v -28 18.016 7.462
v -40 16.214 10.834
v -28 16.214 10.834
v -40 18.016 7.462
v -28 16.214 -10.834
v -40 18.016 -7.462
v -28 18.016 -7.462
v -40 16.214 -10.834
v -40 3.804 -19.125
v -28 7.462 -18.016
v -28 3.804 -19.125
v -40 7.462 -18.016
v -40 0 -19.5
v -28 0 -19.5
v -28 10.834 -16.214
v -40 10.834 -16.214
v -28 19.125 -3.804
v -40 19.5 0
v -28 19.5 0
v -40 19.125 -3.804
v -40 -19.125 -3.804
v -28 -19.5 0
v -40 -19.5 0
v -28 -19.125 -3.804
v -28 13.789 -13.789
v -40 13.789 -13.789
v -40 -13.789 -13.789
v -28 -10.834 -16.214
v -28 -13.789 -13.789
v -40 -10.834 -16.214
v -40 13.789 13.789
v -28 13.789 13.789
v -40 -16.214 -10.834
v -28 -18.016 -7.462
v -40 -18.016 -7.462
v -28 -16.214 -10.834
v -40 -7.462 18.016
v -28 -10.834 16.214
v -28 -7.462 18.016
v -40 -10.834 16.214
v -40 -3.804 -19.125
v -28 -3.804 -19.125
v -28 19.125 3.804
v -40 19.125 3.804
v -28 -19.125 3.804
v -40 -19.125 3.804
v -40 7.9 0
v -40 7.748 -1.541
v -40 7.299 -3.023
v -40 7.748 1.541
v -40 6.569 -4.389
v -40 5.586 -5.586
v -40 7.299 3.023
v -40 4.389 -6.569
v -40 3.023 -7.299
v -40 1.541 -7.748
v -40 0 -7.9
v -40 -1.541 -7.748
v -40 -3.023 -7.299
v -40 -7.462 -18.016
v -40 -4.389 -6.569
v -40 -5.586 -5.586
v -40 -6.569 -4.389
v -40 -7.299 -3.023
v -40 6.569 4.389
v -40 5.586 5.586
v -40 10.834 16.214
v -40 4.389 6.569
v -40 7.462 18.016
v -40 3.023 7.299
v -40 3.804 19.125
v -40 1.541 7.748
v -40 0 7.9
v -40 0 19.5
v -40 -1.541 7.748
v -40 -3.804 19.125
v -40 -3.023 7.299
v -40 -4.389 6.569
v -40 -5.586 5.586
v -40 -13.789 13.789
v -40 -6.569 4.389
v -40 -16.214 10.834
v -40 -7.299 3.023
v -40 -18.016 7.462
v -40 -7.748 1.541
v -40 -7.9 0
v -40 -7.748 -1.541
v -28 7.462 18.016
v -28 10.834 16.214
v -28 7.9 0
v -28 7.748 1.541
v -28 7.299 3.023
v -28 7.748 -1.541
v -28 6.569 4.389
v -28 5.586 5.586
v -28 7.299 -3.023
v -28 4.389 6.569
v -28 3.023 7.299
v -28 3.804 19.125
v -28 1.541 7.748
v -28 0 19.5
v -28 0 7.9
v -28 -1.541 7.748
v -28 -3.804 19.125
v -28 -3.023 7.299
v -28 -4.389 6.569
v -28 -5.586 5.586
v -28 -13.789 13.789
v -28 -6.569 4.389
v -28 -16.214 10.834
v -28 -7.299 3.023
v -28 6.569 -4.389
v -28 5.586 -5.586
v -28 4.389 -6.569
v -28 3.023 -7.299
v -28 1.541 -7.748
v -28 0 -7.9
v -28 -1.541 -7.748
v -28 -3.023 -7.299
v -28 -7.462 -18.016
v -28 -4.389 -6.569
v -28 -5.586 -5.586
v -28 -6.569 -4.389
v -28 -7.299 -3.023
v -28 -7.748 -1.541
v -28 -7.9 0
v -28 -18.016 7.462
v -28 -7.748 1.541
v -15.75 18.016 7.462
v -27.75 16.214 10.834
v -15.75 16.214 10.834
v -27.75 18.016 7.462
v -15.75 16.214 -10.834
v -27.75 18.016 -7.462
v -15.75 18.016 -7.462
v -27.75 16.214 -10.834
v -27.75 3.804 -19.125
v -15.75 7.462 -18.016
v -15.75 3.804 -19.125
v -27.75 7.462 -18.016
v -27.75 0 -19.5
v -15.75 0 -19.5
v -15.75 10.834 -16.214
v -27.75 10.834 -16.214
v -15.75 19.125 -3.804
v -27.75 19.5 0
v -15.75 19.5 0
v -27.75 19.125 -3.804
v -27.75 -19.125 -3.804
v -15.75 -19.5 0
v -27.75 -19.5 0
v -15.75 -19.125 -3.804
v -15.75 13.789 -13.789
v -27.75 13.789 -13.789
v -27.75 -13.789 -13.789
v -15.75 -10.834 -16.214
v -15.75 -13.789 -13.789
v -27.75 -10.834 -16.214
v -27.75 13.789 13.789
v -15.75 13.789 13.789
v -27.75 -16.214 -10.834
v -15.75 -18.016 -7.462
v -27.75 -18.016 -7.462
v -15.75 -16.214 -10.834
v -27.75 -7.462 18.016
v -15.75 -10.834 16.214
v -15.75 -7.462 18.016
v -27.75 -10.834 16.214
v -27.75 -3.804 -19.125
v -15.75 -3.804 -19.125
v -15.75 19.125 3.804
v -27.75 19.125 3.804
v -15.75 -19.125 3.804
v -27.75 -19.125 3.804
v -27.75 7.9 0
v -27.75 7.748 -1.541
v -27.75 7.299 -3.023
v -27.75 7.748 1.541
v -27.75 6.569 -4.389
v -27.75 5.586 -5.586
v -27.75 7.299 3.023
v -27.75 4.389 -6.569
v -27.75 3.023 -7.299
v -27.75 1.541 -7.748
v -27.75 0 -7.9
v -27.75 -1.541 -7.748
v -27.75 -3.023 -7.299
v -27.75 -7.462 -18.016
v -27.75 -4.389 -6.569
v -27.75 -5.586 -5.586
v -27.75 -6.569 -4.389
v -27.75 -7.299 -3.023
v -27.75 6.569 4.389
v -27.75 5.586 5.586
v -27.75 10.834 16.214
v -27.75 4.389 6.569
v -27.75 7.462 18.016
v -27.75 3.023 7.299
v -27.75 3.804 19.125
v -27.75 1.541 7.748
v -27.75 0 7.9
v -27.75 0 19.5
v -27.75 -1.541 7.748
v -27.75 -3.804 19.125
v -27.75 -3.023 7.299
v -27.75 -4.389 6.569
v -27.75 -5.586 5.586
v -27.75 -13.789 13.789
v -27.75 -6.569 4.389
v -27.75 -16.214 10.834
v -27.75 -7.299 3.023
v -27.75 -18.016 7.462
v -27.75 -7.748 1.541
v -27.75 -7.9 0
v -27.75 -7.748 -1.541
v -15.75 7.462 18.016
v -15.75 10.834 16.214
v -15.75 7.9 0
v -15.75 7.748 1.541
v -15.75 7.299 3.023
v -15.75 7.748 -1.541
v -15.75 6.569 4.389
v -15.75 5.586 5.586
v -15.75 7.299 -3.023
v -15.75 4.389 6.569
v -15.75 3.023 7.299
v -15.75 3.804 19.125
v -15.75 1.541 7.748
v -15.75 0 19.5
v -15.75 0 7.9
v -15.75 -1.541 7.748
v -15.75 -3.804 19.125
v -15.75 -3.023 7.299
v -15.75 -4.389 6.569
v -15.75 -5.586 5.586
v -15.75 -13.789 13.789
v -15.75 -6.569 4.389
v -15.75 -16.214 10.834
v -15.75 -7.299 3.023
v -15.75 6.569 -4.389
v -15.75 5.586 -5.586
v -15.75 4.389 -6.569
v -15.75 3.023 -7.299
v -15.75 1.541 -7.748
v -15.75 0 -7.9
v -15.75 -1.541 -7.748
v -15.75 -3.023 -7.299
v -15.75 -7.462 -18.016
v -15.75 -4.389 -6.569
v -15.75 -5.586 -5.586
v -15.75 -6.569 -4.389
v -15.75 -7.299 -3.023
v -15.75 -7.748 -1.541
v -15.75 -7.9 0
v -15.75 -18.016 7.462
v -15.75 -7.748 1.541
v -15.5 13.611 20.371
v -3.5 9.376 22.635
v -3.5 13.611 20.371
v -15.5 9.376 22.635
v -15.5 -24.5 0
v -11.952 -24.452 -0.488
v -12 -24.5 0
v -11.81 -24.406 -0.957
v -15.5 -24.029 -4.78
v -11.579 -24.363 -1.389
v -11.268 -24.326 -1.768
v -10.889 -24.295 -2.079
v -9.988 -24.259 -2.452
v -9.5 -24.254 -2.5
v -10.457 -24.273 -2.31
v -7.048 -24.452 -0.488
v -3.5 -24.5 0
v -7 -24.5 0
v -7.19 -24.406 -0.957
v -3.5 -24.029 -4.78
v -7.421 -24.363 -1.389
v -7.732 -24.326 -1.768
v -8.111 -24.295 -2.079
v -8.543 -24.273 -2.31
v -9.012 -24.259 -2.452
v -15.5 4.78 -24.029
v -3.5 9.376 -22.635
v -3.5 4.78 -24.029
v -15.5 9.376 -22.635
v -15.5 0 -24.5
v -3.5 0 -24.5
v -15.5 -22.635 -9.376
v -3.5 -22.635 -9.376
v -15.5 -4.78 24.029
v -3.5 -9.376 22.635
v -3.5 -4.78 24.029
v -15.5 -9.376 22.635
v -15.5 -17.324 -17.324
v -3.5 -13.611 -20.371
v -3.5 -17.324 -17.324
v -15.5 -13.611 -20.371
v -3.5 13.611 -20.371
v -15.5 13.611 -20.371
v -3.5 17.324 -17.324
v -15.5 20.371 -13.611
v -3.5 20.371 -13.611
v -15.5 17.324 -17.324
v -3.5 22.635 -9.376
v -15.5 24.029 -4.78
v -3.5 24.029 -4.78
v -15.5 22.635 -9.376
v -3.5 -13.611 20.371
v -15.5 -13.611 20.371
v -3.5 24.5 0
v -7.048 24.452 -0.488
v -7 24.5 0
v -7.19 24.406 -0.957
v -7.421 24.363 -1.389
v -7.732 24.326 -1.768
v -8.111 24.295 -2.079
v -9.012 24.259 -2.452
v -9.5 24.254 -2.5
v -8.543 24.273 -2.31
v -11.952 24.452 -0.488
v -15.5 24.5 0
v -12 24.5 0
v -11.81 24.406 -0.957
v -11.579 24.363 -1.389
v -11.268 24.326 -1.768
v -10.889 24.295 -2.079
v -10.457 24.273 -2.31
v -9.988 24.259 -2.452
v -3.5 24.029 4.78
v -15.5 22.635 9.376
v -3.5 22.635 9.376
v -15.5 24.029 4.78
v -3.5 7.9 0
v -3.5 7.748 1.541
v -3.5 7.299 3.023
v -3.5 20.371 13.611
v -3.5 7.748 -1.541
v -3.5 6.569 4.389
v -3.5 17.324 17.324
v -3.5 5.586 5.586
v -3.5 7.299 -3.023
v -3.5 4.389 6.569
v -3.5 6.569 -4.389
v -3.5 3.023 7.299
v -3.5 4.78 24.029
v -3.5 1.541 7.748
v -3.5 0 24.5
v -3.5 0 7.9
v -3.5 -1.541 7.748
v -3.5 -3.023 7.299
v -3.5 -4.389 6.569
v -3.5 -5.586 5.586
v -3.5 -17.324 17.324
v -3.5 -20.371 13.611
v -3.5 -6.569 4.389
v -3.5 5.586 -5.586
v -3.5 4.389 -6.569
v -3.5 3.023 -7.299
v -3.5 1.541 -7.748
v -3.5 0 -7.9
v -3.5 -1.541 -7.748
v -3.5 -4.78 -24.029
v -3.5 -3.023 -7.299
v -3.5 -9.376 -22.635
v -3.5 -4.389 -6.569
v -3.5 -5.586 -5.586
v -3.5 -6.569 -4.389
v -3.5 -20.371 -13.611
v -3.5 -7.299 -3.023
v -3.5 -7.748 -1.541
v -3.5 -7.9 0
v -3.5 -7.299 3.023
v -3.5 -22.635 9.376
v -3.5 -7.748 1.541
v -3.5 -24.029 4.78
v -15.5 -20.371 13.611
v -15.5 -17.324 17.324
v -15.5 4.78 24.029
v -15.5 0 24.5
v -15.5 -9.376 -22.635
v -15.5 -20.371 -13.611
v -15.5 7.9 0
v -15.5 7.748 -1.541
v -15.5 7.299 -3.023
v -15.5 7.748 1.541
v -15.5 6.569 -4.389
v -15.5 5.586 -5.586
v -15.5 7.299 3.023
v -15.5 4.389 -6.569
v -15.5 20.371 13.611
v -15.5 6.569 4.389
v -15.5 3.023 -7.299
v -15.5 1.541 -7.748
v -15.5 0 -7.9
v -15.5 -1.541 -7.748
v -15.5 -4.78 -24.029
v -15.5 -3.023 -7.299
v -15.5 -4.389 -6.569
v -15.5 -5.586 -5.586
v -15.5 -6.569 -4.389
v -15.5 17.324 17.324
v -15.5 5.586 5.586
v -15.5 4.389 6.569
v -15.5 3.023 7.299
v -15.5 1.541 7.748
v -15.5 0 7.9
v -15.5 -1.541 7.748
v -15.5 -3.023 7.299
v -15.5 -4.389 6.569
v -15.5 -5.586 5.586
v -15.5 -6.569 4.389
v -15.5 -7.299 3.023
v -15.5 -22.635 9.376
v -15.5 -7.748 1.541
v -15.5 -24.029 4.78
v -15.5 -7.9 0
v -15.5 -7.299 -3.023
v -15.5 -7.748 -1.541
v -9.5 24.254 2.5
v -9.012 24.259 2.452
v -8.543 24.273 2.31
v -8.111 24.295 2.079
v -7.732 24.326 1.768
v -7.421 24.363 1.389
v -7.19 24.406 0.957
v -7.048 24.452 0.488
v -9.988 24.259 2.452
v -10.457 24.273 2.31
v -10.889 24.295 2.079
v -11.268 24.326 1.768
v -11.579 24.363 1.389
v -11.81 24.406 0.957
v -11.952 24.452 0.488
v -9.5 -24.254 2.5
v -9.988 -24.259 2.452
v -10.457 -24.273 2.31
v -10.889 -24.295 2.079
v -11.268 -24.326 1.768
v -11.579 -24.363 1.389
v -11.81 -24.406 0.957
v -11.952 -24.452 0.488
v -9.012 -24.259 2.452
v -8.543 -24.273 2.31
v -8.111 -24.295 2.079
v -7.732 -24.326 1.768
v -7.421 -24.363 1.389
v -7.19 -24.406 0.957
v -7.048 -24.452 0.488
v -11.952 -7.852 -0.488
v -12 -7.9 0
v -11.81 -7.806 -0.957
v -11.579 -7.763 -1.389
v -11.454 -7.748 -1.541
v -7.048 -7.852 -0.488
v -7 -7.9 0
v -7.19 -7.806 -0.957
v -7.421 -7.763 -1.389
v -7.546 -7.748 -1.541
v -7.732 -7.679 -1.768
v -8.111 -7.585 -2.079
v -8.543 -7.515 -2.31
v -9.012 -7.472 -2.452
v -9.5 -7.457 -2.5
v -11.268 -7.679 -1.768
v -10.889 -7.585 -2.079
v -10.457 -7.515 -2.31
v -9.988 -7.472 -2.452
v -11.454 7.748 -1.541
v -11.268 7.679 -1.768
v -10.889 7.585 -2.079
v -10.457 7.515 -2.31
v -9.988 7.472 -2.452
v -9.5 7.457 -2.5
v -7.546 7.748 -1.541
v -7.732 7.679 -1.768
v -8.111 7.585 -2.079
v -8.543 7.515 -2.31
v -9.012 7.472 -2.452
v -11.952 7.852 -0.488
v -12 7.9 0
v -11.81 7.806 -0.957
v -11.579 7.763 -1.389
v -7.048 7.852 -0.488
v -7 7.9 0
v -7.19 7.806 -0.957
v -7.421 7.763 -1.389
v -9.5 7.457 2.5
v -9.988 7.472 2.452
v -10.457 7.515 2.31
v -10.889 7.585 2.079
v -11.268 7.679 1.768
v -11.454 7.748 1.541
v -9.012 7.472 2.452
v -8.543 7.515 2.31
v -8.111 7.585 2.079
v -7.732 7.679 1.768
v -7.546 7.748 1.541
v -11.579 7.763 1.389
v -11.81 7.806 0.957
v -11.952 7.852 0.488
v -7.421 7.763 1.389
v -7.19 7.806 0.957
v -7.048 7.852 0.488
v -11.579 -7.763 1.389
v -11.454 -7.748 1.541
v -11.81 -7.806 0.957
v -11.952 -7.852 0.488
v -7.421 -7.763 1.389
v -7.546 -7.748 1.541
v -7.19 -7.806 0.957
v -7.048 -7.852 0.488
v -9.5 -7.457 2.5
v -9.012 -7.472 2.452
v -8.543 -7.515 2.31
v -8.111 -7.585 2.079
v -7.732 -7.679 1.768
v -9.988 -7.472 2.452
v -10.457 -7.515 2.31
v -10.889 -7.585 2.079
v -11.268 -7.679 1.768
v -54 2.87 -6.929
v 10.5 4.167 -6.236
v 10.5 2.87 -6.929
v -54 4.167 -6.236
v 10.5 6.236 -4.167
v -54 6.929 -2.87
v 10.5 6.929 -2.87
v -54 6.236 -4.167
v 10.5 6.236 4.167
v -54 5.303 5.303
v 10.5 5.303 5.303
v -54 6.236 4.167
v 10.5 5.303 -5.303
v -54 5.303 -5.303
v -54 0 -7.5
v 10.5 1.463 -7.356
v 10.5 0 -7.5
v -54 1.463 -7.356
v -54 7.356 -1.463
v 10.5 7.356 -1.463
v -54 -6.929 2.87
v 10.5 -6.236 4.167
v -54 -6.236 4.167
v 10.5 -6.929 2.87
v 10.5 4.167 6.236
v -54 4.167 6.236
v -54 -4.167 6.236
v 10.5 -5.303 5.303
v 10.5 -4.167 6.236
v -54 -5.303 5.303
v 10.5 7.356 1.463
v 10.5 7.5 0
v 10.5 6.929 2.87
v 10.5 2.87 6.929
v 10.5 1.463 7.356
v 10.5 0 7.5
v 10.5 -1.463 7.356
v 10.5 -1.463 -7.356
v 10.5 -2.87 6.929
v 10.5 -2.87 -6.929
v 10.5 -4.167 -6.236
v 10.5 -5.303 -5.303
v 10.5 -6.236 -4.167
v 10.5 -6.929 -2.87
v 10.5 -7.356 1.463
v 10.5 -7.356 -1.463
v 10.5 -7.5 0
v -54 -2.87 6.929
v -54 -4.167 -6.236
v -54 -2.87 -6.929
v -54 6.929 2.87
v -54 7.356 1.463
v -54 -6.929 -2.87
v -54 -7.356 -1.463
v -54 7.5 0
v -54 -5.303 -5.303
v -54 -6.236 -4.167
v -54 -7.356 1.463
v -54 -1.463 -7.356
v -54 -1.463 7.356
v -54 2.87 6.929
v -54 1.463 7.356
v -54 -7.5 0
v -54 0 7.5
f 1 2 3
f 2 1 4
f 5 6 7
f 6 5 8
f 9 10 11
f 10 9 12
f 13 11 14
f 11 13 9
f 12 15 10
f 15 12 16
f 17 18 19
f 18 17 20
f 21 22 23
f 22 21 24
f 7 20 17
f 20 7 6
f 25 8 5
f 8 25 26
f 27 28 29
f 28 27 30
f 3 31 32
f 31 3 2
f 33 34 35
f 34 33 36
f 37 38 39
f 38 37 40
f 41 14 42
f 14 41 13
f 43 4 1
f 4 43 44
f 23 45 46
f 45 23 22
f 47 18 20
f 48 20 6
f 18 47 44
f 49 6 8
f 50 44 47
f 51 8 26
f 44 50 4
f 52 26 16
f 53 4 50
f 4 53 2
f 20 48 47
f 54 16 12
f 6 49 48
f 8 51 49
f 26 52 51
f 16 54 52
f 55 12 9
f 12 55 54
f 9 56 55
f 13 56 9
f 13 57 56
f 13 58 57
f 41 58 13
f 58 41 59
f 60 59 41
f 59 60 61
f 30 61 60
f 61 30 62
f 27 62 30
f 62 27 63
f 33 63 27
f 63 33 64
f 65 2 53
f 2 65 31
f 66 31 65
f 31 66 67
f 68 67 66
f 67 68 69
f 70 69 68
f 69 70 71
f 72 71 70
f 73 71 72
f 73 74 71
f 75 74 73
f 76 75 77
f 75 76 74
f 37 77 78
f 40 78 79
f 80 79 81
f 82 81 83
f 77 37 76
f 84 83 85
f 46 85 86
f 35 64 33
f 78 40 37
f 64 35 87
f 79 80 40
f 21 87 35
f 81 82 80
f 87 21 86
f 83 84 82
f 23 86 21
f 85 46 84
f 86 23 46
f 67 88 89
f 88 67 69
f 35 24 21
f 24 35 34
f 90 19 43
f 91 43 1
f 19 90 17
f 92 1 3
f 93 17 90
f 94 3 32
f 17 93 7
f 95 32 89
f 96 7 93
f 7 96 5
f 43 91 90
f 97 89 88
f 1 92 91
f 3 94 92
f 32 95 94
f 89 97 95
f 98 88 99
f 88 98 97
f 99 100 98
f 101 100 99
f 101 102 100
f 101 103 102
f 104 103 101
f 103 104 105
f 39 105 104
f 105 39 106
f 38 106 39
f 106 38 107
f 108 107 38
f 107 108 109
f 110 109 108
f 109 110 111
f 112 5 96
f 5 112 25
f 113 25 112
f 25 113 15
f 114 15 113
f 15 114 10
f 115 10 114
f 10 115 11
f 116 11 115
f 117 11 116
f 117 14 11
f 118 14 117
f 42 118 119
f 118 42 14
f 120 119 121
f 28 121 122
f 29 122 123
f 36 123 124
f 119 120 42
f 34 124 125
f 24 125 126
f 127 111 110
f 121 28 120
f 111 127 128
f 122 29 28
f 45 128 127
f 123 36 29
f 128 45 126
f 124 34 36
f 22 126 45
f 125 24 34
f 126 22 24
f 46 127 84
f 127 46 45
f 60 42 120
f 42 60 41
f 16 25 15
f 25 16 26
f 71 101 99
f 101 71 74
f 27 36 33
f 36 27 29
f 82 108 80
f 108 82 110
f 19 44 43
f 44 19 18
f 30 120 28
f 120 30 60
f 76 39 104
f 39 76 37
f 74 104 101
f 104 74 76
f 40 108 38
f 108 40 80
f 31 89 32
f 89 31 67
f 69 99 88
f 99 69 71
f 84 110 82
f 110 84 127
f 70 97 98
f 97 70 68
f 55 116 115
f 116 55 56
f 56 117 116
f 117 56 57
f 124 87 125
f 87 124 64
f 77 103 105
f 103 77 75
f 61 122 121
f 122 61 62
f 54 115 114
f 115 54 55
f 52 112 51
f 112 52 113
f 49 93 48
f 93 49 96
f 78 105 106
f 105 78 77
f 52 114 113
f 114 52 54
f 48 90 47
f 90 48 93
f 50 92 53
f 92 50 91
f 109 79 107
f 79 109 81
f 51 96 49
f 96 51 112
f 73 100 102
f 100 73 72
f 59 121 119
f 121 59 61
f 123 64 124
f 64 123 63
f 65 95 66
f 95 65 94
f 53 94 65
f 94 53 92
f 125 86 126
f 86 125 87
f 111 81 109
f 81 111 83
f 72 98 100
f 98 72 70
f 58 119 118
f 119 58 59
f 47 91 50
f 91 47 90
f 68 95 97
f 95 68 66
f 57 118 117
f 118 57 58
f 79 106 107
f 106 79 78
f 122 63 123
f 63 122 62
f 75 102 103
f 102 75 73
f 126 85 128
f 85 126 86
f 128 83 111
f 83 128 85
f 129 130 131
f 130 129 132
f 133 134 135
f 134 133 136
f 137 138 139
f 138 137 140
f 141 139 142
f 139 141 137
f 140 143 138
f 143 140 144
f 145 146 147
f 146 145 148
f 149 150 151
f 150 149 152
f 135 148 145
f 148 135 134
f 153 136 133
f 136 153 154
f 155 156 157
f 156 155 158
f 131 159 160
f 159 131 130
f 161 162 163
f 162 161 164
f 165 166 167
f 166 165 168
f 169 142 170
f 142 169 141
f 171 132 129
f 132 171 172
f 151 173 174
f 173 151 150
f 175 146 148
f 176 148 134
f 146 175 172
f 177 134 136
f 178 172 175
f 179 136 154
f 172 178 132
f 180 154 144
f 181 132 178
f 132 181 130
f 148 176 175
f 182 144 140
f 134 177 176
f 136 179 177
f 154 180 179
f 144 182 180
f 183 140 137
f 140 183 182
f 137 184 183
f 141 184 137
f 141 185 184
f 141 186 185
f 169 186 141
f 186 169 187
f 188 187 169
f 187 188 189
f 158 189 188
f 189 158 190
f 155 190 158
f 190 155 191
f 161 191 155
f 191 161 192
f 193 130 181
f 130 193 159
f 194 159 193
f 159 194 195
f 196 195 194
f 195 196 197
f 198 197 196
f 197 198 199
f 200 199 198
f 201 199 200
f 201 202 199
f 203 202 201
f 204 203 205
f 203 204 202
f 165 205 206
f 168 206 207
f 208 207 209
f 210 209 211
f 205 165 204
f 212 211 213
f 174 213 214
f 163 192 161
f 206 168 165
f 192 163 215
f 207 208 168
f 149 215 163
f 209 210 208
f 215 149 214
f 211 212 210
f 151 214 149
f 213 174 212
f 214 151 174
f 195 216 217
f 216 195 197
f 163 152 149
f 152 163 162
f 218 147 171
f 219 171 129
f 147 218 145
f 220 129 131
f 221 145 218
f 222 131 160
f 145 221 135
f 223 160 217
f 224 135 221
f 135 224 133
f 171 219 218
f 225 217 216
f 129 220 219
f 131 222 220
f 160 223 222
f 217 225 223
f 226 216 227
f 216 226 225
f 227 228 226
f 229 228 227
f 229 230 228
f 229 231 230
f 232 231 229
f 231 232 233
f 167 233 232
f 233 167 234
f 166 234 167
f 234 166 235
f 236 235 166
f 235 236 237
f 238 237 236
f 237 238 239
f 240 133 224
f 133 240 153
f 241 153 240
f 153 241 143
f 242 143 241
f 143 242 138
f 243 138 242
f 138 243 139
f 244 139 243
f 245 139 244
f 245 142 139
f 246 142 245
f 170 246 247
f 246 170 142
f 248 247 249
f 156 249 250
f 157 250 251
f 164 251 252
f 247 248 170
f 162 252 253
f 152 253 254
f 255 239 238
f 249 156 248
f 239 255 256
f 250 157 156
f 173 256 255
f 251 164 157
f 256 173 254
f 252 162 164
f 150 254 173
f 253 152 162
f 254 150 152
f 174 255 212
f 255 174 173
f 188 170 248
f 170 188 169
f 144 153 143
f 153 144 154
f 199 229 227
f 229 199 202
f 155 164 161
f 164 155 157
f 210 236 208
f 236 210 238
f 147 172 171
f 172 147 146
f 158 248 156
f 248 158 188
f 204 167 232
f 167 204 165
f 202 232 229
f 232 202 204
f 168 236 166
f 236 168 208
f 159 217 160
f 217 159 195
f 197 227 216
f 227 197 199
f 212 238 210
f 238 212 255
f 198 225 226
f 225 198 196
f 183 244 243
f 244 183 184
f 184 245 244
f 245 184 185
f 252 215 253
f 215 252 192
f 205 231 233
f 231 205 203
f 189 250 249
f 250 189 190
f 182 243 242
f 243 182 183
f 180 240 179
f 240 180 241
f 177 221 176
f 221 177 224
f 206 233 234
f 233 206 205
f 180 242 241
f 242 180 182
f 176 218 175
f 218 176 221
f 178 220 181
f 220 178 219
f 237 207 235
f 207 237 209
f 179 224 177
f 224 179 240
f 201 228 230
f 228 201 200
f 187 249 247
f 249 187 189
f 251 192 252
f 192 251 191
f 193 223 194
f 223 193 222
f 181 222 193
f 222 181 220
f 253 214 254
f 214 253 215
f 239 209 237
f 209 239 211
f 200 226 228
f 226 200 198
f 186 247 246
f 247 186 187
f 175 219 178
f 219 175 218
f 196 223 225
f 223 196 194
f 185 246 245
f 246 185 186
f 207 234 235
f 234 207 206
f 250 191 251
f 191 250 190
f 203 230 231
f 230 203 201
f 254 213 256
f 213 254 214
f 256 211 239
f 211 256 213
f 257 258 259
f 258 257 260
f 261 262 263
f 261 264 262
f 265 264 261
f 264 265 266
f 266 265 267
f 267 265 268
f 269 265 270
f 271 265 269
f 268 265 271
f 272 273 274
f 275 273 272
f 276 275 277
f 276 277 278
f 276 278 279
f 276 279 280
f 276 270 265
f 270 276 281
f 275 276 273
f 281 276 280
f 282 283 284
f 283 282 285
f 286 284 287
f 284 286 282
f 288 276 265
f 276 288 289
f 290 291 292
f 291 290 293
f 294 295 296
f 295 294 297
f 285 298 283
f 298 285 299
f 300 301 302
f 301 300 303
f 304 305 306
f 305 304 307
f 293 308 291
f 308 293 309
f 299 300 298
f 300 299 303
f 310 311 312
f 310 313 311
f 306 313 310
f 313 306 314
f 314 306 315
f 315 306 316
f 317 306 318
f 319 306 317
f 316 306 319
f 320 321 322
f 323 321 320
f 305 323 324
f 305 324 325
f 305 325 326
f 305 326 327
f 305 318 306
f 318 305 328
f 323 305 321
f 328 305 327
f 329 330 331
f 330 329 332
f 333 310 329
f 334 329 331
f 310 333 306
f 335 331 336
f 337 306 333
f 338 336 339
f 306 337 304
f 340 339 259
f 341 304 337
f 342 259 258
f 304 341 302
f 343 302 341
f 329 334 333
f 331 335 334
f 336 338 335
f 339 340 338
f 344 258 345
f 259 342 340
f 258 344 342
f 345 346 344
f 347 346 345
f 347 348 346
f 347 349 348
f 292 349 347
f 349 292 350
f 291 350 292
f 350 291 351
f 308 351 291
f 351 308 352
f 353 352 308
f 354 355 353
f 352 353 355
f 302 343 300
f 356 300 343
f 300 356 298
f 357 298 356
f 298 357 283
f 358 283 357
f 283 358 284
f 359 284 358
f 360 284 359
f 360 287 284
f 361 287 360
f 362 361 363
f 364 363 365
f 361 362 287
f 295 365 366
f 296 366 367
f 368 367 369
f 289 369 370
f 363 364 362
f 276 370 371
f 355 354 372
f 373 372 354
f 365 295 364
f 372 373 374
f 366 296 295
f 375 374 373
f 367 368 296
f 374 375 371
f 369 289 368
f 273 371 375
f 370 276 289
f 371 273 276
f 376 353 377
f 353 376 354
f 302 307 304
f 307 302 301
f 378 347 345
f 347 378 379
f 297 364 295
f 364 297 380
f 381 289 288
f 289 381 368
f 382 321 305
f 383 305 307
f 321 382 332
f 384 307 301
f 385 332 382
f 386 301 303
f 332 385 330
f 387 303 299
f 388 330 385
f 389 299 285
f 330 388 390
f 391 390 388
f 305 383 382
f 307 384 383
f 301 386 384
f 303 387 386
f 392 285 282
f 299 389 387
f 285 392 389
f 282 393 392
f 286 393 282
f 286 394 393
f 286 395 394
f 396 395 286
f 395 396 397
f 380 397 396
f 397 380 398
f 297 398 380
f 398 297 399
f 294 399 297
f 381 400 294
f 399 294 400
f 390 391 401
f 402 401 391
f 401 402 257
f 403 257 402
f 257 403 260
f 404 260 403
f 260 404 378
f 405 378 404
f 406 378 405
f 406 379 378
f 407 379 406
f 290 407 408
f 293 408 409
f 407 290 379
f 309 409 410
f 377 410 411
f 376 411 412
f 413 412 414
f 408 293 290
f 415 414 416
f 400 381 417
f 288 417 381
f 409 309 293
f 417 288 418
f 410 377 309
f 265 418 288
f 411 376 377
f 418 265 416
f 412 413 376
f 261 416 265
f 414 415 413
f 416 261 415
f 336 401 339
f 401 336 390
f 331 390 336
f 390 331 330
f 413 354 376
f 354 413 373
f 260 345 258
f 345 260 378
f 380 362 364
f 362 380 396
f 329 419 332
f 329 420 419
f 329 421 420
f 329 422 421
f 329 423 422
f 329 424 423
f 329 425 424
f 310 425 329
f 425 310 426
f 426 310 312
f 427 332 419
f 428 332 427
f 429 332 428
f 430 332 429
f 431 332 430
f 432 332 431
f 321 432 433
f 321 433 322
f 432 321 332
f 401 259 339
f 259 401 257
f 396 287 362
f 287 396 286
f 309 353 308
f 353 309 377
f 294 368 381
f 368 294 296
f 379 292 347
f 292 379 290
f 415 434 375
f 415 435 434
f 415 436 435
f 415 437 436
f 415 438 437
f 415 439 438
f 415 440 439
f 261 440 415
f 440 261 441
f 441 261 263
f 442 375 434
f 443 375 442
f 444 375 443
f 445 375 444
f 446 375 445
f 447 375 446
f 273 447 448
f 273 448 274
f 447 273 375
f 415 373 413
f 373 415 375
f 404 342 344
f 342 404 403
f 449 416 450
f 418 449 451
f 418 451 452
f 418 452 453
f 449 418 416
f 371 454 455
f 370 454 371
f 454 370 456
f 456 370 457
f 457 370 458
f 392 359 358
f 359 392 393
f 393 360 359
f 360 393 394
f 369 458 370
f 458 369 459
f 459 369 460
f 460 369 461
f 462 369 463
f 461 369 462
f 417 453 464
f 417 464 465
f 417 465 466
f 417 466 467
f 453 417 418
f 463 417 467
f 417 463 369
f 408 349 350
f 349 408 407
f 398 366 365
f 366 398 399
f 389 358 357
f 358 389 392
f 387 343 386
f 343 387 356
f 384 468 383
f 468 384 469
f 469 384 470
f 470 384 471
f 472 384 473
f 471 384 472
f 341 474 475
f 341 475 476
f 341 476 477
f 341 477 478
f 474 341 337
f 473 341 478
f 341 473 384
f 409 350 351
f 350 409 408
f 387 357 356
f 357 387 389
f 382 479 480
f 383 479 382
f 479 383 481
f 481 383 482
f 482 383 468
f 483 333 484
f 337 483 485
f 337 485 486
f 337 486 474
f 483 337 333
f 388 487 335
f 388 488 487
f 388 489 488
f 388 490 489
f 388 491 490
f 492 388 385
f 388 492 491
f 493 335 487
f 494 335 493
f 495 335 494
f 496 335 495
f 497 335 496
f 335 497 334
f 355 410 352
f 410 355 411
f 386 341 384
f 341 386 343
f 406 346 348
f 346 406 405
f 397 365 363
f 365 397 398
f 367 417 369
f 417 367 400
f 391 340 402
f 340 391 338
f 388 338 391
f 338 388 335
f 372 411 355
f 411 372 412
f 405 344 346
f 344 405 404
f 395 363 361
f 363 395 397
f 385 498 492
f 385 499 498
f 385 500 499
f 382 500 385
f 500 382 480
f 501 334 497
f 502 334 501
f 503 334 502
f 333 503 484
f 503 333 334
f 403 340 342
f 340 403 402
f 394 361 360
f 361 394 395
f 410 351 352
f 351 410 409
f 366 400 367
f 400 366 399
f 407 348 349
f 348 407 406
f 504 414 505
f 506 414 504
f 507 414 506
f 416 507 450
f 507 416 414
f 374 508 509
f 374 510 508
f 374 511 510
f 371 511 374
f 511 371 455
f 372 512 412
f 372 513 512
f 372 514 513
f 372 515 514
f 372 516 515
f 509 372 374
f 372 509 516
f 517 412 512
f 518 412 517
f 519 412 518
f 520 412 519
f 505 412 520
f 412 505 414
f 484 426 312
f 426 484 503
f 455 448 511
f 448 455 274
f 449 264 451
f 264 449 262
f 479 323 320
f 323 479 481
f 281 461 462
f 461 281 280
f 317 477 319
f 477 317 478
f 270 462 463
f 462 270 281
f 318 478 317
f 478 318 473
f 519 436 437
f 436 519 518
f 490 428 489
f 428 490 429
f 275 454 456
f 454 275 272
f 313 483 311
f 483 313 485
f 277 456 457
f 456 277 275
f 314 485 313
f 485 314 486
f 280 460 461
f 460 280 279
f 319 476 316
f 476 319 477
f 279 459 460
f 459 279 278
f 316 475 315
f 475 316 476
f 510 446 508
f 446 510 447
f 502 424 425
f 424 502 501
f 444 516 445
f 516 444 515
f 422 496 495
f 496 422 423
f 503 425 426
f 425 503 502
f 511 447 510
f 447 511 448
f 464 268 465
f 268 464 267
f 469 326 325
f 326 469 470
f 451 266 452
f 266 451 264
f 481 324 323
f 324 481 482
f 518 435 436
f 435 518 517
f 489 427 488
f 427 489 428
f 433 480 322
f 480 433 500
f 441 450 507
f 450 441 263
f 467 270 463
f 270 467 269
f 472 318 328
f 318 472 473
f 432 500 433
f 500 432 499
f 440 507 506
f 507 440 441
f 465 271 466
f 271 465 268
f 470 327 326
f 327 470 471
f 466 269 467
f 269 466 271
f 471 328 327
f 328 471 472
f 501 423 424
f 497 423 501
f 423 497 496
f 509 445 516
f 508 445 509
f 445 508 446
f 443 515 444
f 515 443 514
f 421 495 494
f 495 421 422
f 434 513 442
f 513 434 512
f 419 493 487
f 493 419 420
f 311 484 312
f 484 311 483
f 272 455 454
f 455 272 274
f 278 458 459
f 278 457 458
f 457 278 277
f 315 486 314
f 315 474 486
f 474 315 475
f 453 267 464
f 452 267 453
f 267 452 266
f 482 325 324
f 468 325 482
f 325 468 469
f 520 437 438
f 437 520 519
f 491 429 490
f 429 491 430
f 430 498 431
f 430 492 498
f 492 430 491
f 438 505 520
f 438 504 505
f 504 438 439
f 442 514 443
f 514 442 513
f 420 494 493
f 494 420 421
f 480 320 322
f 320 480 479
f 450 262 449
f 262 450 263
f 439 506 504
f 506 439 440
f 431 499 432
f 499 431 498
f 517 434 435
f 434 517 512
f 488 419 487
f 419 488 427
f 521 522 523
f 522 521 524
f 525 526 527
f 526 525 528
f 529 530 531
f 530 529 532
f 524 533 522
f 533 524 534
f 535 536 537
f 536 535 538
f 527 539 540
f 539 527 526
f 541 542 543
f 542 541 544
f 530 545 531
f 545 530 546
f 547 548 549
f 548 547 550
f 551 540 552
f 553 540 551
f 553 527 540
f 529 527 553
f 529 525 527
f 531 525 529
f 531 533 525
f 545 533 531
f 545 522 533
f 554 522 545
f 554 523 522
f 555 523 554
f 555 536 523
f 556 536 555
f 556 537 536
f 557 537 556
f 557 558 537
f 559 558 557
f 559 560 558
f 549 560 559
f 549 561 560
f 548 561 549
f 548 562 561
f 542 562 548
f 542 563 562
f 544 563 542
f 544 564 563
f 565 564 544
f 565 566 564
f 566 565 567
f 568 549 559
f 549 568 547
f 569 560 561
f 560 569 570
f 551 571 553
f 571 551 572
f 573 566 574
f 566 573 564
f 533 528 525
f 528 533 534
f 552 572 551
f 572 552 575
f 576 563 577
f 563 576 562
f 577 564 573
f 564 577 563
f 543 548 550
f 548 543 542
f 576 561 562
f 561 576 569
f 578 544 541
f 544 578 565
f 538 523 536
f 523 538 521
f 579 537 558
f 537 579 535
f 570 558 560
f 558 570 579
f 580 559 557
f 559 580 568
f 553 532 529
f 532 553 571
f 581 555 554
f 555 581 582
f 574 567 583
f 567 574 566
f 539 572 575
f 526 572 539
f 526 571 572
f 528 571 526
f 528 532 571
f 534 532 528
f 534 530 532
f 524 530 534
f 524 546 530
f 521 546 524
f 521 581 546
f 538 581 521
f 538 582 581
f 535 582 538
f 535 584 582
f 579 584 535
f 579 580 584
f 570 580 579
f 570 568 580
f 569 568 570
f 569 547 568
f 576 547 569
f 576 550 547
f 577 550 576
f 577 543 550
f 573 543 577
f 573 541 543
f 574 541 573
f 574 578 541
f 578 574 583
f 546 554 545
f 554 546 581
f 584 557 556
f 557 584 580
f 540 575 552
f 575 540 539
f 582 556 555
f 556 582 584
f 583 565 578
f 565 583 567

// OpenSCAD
$fn = 32;

// ------------------------------------------------------------------------
// Shaft with rings and collars: d15 shaft, 3 rings
// Every part is its own module, assembly() places them once.
// ------------------------------------------------------------------------

// --- part 1 ---
module shaft() {
  translate([0, 0, -32.25]) cylinder(h = 64.5, d = 15);
}

// --- part 2 ---
module spacer_a() {
  difference() {
      translate([0, 0, 0]) cylinder(h = 12, d = 39);
      translate([0, 0, -1]) cylinder(h = 14, d = 15.8);
    }
}

// --- part 3 ---
module spacer_b() {
  difference() {
      translate([0, 0, 0]) cylinder(h = 12, d = 39);
      translate([0, 0, -1]) cylinder(h = 14, d = 15.8);
    }
}

// --- part 4 ---
module collar_a() {
  difference() {
    cylinder(h = 12, d = 49);
    translate([0, 0, -1]) cylinder(h = 14, d = 15.8);
    translate([0, 0, 6]) rotate([90, 0, 0]) cylinder(h = 51, d = 5, center = true);
  }
}

// --- assembly ---
module assembly() {
  translate([-21.75, 0, 0]) rotate([0, 90, 0]) shaft();
  translate([-40, 0, 0]) rotate([0, 90, 0]) spacer_a();
  translate([-27.75, 0, 0]) rotate([0, 90, 0]) spacer_b();
  translate([-15.5, 0, 0]) rotate([0, 90, 0]) collar_a();
}

assembly();
